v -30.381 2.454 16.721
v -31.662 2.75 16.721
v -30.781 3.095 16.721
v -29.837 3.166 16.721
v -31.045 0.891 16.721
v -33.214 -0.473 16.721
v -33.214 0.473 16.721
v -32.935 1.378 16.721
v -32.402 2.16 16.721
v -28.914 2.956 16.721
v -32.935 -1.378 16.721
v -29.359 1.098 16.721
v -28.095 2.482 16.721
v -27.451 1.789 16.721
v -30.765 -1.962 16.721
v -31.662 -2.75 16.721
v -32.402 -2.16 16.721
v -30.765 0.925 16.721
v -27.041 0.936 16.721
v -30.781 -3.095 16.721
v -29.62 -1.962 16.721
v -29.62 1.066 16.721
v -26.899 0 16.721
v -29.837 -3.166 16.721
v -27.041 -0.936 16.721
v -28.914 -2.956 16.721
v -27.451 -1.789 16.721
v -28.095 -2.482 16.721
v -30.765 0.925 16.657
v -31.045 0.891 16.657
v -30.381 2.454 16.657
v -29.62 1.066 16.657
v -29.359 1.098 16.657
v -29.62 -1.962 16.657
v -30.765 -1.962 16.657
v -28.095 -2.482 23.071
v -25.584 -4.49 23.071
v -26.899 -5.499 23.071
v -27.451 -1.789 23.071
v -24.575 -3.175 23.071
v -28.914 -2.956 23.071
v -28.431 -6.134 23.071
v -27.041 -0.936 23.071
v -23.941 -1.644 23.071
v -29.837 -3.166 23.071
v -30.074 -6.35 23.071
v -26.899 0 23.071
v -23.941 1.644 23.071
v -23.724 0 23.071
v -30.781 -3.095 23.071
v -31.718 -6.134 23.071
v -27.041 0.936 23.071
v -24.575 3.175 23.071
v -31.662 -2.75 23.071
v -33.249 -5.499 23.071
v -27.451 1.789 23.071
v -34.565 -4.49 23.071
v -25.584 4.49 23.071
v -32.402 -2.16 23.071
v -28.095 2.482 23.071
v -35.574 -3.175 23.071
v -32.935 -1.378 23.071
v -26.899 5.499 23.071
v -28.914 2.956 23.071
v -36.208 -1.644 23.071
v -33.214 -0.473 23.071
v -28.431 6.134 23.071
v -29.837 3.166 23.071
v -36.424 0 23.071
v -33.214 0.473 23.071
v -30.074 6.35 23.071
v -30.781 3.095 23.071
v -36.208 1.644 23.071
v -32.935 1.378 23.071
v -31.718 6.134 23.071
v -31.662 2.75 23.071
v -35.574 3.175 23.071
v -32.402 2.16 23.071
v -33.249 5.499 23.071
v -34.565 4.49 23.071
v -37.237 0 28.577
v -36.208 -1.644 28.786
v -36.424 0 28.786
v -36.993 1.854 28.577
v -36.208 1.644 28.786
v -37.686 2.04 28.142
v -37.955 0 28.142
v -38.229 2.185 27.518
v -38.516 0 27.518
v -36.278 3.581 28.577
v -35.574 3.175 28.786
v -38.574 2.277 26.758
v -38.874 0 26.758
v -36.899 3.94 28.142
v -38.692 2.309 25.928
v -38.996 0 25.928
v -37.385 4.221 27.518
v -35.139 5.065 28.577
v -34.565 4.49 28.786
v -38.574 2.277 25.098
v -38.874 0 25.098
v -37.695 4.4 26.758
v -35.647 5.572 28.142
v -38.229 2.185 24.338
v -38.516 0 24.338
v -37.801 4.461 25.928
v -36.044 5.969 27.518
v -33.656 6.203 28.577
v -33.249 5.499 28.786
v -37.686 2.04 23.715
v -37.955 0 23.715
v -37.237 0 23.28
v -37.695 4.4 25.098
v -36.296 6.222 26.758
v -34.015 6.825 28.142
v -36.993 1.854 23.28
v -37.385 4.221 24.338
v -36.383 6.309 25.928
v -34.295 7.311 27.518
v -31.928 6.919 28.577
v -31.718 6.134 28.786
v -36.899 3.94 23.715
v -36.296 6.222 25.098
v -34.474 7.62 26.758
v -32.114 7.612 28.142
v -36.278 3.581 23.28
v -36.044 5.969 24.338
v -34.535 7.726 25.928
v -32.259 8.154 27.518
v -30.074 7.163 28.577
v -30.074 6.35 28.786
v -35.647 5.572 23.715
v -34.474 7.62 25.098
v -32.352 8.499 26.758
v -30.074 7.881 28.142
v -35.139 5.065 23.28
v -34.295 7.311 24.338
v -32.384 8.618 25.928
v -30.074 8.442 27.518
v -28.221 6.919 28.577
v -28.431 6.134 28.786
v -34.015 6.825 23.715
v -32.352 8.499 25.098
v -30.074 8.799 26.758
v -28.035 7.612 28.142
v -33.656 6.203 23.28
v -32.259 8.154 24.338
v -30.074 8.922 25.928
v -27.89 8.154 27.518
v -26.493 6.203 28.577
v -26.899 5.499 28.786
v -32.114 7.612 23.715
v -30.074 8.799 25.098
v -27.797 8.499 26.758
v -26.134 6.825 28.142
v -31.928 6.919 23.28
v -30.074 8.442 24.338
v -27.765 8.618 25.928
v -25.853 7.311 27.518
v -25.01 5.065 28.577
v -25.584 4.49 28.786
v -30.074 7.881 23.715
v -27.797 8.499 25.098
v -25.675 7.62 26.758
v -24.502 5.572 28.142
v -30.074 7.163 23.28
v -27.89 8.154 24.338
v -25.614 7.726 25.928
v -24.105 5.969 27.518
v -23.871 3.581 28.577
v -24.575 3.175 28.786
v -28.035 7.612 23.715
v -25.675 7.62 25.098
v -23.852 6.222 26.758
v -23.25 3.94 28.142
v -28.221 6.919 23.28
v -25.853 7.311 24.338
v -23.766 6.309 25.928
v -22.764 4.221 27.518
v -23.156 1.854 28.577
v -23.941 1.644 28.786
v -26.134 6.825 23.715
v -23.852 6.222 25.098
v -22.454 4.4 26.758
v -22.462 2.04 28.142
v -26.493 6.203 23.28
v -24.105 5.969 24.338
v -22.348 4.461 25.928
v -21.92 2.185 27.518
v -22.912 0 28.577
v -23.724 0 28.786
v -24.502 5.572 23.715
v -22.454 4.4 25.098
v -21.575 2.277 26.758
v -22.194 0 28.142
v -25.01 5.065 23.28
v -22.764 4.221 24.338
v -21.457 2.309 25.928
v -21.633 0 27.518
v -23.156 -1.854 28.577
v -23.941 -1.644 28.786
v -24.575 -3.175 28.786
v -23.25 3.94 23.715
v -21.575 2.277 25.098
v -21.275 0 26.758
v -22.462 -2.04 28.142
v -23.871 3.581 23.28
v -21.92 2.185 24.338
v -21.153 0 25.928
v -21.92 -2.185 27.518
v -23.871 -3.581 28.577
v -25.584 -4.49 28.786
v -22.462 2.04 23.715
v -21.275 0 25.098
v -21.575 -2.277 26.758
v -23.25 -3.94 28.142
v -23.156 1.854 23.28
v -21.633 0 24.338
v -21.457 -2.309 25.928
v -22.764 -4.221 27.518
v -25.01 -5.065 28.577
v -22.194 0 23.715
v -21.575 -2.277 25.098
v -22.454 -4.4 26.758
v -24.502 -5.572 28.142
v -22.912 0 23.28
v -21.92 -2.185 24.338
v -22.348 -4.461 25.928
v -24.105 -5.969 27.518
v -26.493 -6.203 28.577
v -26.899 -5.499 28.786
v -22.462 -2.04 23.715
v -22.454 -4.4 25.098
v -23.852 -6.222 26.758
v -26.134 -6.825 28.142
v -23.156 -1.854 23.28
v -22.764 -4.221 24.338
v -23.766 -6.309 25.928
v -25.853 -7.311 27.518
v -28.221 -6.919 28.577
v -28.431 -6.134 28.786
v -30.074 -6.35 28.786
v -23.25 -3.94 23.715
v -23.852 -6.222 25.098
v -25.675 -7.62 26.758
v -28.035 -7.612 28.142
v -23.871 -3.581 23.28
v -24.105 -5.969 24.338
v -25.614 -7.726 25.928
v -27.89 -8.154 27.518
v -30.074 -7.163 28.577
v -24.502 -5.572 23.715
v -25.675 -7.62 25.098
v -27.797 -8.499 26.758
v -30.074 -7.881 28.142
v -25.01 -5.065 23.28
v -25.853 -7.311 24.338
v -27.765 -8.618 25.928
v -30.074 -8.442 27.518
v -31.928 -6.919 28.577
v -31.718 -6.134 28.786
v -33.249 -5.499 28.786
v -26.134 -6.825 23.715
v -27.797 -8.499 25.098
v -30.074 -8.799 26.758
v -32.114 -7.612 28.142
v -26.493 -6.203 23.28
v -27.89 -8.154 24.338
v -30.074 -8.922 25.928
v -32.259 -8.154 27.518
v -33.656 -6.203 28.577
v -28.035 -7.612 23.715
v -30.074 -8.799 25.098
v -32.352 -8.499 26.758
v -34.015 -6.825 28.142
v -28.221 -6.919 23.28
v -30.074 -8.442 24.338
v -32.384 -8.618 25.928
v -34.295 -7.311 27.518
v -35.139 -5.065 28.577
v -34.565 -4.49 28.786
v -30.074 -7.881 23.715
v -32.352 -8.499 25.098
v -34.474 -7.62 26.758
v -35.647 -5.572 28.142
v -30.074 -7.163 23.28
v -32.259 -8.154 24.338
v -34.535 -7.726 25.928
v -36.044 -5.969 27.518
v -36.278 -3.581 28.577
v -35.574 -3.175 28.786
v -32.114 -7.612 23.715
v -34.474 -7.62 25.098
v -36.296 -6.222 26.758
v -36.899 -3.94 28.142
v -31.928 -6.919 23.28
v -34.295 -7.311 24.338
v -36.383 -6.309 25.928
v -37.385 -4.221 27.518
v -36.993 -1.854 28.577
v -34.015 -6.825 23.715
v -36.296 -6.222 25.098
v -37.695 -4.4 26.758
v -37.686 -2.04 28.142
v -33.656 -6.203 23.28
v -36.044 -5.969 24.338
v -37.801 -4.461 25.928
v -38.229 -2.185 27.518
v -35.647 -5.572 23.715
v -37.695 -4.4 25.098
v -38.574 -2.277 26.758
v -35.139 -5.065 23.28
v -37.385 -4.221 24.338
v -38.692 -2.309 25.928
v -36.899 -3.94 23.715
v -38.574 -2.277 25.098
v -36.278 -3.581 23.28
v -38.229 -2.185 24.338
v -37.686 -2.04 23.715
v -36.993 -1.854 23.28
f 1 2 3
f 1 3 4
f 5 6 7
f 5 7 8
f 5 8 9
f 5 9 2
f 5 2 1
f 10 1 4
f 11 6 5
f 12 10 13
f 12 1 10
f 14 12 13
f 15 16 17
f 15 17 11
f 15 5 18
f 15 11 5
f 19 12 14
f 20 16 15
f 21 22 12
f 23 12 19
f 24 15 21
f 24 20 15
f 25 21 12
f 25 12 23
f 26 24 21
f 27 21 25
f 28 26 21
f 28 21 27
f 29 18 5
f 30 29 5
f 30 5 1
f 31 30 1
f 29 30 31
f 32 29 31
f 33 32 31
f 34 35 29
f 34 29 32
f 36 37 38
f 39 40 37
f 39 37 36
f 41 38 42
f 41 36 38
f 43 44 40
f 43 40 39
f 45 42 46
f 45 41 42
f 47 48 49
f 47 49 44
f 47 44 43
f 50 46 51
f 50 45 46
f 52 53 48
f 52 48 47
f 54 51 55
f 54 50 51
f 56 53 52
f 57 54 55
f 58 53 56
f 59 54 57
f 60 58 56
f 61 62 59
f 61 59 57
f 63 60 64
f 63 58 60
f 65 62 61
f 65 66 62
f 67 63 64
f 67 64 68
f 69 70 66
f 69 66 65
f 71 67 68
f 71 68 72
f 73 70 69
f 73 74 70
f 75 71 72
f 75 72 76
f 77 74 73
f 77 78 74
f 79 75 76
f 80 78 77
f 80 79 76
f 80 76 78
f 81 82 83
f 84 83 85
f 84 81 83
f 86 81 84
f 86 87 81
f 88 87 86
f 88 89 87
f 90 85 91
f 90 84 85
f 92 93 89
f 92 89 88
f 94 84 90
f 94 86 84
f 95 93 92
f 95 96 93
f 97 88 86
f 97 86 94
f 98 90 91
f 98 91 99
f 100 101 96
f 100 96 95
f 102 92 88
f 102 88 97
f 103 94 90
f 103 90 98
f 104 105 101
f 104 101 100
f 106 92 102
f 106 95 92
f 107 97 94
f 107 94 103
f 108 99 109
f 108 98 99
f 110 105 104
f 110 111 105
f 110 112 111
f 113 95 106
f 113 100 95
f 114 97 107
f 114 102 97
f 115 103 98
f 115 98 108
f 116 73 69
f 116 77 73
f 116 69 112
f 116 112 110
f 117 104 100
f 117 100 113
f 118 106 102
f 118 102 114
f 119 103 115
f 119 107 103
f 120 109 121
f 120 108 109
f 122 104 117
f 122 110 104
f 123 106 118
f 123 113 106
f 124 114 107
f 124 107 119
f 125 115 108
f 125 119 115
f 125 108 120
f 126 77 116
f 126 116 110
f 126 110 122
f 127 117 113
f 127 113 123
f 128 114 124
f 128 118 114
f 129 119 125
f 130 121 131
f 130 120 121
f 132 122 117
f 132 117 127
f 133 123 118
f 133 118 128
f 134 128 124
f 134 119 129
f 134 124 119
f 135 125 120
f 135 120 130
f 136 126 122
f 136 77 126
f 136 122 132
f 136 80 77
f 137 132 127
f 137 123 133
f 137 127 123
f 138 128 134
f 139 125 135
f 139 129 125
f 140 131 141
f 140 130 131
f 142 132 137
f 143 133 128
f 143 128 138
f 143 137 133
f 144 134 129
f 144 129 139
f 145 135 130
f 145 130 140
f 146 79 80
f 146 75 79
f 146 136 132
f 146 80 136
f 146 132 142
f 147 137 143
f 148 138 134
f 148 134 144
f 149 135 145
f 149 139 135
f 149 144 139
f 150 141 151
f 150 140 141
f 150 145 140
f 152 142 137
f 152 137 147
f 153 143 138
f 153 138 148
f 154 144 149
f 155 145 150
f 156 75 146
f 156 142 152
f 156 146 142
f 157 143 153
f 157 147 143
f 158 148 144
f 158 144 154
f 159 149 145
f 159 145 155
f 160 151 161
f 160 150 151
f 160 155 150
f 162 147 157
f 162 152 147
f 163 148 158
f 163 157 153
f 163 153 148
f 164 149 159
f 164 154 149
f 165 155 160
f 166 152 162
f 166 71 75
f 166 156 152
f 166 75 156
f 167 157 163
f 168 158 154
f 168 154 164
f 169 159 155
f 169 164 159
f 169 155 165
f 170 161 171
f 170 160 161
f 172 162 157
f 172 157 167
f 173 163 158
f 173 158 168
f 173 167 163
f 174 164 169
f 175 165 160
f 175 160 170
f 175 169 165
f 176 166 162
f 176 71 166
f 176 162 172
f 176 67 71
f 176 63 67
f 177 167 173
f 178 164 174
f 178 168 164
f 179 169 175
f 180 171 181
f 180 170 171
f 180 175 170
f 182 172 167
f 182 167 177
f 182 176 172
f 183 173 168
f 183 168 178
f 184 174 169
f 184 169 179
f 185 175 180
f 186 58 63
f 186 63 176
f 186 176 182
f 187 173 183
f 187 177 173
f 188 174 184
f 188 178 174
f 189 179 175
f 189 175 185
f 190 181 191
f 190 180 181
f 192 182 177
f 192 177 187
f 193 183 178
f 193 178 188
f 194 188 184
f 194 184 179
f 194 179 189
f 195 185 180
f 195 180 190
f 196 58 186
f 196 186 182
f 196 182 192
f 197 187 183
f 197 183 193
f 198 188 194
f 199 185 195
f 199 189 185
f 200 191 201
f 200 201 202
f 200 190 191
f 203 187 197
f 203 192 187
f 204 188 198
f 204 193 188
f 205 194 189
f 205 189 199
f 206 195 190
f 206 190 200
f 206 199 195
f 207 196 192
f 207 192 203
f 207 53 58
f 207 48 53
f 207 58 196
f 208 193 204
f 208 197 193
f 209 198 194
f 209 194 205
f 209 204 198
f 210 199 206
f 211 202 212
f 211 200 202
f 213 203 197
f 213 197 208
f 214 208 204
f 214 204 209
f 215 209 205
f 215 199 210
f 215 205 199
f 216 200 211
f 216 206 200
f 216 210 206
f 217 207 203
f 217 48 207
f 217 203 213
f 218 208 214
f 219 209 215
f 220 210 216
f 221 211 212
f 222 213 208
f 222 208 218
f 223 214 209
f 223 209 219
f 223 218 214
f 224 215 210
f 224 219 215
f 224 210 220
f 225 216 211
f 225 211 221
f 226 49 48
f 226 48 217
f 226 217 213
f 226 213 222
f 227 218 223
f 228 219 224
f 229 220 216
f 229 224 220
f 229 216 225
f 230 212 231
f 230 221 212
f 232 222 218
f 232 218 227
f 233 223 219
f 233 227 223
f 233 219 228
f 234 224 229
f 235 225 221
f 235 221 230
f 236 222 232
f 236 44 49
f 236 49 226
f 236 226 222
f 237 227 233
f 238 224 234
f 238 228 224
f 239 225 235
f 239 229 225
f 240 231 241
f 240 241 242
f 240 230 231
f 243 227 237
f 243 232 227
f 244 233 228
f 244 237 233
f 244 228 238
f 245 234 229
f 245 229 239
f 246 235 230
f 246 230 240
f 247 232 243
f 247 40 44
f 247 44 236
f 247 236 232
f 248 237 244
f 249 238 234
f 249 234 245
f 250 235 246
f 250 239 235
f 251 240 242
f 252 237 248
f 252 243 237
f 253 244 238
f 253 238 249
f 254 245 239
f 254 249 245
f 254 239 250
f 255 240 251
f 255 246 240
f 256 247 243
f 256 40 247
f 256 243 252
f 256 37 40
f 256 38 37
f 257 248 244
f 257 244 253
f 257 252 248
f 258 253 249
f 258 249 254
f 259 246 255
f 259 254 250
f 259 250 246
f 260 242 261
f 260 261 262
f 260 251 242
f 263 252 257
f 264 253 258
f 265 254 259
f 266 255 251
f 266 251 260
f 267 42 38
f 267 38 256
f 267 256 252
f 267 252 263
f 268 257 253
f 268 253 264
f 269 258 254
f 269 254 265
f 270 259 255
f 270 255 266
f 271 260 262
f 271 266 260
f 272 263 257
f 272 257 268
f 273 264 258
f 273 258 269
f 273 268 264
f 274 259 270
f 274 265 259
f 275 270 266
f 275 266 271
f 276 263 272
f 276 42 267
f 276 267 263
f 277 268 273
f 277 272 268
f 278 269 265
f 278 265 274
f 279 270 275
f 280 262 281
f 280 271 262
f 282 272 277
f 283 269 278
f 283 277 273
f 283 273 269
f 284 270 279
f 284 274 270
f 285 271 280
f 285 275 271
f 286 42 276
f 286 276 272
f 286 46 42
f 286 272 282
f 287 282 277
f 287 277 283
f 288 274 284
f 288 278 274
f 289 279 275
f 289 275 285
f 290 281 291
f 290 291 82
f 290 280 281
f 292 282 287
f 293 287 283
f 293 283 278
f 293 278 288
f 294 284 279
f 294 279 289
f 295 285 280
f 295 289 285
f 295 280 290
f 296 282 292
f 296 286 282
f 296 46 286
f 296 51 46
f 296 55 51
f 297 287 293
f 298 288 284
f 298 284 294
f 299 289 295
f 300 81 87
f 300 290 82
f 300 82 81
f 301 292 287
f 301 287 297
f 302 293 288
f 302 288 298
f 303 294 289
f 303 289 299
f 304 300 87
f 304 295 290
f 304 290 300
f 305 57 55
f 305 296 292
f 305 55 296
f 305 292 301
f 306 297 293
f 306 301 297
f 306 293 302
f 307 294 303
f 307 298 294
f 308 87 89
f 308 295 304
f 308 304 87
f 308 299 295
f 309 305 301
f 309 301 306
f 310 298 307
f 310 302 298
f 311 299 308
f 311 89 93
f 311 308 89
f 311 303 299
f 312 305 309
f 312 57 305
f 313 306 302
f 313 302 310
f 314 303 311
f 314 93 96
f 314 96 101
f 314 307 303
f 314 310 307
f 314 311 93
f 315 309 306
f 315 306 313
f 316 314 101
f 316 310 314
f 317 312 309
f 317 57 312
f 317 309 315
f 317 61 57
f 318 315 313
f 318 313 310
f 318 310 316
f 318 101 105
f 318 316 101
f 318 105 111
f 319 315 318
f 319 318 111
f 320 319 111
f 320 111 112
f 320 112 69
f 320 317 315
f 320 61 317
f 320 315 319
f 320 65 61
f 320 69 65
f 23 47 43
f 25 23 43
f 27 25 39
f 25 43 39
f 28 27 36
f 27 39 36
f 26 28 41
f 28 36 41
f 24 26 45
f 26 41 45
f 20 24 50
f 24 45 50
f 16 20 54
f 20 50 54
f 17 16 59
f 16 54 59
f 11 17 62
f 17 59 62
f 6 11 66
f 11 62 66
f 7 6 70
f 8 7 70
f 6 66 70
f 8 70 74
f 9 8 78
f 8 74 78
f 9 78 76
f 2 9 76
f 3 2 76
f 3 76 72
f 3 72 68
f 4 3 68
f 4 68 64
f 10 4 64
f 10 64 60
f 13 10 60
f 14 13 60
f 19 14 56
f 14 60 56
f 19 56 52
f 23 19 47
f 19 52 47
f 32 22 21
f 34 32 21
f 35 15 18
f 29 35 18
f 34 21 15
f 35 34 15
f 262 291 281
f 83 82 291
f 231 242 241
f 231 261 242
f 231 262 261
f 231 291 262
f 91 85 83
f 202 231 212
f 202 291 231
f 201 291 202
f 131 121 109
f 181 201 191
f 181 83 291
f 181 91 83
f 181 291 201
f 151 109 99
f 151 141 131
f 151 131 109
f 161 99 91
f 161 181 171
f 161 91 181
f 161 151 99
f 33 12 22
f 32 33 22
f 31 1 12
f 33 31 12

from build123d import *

# Parameters (mm, degrees)
F2_R     = 3.175
F3_DEPTH = 6.35
F5_DEPTH = 0.0635


with BuildPart() as f1:
    # F0 (on Front) → F1 (revolve)
    with BuildSketch(Plane.XZ):
        with BuildLine():
            Line((-30.074457, 23.07059), (-30.074457, 28.78559))
            Line((-30.074457, 28.78559), (-36.424457, 28.78559))
            ThreePointArc((-36.424457, 28.78559), (-38.996207, 25.92809), (-36.424457, 23.07059))
            Line((-36.424457, 23.07059), (-30.074457, 23.07059))
        make_face()
    revolve(axis=Axis((-30.074457, 0, 26.24559), (0, 0, -1)))

    # F2 (on face) → F3 (join)
    with BuildSketch(Plane(origin=(0, 0, 23.07059), x_dir=(1, 0, 0), z_dir=(0, 0, -1))):
        with Locations((-30.074457, 0)):
            Circle(F2_R)
    extrude(amount=F3_DEPTH)

    # F4 (on face) → F5 (join)
    with BuildSketch(Plane(origin=(0, 0, 16.72059), x_dir=(1, 0, 0), z_dir=(0, 0, -1))):
        Polygon((-30.765451, -0.924808), (-29.620068, -1.065534), (-29.620068, 1.96214), (-30.765451, 1.96214), align=None)
        Polygon((-30.765451, -1.246022), (-29.620068, -1.246022), (-29.620068, -1.065534), (-30.765451, -0.924808), align=None)
        Polygon((-29.620068, -1.065534), (-29.620068, -1.246022), (-30.765451, -1.246022), (-30.765451, -0.924808), (-31.044574, -0.890514), (-30.381126, -2.453838), (-29.358972, -1.097613), align=None)
    extrude(amount=F5_DEPTH)


solid = f1.part
